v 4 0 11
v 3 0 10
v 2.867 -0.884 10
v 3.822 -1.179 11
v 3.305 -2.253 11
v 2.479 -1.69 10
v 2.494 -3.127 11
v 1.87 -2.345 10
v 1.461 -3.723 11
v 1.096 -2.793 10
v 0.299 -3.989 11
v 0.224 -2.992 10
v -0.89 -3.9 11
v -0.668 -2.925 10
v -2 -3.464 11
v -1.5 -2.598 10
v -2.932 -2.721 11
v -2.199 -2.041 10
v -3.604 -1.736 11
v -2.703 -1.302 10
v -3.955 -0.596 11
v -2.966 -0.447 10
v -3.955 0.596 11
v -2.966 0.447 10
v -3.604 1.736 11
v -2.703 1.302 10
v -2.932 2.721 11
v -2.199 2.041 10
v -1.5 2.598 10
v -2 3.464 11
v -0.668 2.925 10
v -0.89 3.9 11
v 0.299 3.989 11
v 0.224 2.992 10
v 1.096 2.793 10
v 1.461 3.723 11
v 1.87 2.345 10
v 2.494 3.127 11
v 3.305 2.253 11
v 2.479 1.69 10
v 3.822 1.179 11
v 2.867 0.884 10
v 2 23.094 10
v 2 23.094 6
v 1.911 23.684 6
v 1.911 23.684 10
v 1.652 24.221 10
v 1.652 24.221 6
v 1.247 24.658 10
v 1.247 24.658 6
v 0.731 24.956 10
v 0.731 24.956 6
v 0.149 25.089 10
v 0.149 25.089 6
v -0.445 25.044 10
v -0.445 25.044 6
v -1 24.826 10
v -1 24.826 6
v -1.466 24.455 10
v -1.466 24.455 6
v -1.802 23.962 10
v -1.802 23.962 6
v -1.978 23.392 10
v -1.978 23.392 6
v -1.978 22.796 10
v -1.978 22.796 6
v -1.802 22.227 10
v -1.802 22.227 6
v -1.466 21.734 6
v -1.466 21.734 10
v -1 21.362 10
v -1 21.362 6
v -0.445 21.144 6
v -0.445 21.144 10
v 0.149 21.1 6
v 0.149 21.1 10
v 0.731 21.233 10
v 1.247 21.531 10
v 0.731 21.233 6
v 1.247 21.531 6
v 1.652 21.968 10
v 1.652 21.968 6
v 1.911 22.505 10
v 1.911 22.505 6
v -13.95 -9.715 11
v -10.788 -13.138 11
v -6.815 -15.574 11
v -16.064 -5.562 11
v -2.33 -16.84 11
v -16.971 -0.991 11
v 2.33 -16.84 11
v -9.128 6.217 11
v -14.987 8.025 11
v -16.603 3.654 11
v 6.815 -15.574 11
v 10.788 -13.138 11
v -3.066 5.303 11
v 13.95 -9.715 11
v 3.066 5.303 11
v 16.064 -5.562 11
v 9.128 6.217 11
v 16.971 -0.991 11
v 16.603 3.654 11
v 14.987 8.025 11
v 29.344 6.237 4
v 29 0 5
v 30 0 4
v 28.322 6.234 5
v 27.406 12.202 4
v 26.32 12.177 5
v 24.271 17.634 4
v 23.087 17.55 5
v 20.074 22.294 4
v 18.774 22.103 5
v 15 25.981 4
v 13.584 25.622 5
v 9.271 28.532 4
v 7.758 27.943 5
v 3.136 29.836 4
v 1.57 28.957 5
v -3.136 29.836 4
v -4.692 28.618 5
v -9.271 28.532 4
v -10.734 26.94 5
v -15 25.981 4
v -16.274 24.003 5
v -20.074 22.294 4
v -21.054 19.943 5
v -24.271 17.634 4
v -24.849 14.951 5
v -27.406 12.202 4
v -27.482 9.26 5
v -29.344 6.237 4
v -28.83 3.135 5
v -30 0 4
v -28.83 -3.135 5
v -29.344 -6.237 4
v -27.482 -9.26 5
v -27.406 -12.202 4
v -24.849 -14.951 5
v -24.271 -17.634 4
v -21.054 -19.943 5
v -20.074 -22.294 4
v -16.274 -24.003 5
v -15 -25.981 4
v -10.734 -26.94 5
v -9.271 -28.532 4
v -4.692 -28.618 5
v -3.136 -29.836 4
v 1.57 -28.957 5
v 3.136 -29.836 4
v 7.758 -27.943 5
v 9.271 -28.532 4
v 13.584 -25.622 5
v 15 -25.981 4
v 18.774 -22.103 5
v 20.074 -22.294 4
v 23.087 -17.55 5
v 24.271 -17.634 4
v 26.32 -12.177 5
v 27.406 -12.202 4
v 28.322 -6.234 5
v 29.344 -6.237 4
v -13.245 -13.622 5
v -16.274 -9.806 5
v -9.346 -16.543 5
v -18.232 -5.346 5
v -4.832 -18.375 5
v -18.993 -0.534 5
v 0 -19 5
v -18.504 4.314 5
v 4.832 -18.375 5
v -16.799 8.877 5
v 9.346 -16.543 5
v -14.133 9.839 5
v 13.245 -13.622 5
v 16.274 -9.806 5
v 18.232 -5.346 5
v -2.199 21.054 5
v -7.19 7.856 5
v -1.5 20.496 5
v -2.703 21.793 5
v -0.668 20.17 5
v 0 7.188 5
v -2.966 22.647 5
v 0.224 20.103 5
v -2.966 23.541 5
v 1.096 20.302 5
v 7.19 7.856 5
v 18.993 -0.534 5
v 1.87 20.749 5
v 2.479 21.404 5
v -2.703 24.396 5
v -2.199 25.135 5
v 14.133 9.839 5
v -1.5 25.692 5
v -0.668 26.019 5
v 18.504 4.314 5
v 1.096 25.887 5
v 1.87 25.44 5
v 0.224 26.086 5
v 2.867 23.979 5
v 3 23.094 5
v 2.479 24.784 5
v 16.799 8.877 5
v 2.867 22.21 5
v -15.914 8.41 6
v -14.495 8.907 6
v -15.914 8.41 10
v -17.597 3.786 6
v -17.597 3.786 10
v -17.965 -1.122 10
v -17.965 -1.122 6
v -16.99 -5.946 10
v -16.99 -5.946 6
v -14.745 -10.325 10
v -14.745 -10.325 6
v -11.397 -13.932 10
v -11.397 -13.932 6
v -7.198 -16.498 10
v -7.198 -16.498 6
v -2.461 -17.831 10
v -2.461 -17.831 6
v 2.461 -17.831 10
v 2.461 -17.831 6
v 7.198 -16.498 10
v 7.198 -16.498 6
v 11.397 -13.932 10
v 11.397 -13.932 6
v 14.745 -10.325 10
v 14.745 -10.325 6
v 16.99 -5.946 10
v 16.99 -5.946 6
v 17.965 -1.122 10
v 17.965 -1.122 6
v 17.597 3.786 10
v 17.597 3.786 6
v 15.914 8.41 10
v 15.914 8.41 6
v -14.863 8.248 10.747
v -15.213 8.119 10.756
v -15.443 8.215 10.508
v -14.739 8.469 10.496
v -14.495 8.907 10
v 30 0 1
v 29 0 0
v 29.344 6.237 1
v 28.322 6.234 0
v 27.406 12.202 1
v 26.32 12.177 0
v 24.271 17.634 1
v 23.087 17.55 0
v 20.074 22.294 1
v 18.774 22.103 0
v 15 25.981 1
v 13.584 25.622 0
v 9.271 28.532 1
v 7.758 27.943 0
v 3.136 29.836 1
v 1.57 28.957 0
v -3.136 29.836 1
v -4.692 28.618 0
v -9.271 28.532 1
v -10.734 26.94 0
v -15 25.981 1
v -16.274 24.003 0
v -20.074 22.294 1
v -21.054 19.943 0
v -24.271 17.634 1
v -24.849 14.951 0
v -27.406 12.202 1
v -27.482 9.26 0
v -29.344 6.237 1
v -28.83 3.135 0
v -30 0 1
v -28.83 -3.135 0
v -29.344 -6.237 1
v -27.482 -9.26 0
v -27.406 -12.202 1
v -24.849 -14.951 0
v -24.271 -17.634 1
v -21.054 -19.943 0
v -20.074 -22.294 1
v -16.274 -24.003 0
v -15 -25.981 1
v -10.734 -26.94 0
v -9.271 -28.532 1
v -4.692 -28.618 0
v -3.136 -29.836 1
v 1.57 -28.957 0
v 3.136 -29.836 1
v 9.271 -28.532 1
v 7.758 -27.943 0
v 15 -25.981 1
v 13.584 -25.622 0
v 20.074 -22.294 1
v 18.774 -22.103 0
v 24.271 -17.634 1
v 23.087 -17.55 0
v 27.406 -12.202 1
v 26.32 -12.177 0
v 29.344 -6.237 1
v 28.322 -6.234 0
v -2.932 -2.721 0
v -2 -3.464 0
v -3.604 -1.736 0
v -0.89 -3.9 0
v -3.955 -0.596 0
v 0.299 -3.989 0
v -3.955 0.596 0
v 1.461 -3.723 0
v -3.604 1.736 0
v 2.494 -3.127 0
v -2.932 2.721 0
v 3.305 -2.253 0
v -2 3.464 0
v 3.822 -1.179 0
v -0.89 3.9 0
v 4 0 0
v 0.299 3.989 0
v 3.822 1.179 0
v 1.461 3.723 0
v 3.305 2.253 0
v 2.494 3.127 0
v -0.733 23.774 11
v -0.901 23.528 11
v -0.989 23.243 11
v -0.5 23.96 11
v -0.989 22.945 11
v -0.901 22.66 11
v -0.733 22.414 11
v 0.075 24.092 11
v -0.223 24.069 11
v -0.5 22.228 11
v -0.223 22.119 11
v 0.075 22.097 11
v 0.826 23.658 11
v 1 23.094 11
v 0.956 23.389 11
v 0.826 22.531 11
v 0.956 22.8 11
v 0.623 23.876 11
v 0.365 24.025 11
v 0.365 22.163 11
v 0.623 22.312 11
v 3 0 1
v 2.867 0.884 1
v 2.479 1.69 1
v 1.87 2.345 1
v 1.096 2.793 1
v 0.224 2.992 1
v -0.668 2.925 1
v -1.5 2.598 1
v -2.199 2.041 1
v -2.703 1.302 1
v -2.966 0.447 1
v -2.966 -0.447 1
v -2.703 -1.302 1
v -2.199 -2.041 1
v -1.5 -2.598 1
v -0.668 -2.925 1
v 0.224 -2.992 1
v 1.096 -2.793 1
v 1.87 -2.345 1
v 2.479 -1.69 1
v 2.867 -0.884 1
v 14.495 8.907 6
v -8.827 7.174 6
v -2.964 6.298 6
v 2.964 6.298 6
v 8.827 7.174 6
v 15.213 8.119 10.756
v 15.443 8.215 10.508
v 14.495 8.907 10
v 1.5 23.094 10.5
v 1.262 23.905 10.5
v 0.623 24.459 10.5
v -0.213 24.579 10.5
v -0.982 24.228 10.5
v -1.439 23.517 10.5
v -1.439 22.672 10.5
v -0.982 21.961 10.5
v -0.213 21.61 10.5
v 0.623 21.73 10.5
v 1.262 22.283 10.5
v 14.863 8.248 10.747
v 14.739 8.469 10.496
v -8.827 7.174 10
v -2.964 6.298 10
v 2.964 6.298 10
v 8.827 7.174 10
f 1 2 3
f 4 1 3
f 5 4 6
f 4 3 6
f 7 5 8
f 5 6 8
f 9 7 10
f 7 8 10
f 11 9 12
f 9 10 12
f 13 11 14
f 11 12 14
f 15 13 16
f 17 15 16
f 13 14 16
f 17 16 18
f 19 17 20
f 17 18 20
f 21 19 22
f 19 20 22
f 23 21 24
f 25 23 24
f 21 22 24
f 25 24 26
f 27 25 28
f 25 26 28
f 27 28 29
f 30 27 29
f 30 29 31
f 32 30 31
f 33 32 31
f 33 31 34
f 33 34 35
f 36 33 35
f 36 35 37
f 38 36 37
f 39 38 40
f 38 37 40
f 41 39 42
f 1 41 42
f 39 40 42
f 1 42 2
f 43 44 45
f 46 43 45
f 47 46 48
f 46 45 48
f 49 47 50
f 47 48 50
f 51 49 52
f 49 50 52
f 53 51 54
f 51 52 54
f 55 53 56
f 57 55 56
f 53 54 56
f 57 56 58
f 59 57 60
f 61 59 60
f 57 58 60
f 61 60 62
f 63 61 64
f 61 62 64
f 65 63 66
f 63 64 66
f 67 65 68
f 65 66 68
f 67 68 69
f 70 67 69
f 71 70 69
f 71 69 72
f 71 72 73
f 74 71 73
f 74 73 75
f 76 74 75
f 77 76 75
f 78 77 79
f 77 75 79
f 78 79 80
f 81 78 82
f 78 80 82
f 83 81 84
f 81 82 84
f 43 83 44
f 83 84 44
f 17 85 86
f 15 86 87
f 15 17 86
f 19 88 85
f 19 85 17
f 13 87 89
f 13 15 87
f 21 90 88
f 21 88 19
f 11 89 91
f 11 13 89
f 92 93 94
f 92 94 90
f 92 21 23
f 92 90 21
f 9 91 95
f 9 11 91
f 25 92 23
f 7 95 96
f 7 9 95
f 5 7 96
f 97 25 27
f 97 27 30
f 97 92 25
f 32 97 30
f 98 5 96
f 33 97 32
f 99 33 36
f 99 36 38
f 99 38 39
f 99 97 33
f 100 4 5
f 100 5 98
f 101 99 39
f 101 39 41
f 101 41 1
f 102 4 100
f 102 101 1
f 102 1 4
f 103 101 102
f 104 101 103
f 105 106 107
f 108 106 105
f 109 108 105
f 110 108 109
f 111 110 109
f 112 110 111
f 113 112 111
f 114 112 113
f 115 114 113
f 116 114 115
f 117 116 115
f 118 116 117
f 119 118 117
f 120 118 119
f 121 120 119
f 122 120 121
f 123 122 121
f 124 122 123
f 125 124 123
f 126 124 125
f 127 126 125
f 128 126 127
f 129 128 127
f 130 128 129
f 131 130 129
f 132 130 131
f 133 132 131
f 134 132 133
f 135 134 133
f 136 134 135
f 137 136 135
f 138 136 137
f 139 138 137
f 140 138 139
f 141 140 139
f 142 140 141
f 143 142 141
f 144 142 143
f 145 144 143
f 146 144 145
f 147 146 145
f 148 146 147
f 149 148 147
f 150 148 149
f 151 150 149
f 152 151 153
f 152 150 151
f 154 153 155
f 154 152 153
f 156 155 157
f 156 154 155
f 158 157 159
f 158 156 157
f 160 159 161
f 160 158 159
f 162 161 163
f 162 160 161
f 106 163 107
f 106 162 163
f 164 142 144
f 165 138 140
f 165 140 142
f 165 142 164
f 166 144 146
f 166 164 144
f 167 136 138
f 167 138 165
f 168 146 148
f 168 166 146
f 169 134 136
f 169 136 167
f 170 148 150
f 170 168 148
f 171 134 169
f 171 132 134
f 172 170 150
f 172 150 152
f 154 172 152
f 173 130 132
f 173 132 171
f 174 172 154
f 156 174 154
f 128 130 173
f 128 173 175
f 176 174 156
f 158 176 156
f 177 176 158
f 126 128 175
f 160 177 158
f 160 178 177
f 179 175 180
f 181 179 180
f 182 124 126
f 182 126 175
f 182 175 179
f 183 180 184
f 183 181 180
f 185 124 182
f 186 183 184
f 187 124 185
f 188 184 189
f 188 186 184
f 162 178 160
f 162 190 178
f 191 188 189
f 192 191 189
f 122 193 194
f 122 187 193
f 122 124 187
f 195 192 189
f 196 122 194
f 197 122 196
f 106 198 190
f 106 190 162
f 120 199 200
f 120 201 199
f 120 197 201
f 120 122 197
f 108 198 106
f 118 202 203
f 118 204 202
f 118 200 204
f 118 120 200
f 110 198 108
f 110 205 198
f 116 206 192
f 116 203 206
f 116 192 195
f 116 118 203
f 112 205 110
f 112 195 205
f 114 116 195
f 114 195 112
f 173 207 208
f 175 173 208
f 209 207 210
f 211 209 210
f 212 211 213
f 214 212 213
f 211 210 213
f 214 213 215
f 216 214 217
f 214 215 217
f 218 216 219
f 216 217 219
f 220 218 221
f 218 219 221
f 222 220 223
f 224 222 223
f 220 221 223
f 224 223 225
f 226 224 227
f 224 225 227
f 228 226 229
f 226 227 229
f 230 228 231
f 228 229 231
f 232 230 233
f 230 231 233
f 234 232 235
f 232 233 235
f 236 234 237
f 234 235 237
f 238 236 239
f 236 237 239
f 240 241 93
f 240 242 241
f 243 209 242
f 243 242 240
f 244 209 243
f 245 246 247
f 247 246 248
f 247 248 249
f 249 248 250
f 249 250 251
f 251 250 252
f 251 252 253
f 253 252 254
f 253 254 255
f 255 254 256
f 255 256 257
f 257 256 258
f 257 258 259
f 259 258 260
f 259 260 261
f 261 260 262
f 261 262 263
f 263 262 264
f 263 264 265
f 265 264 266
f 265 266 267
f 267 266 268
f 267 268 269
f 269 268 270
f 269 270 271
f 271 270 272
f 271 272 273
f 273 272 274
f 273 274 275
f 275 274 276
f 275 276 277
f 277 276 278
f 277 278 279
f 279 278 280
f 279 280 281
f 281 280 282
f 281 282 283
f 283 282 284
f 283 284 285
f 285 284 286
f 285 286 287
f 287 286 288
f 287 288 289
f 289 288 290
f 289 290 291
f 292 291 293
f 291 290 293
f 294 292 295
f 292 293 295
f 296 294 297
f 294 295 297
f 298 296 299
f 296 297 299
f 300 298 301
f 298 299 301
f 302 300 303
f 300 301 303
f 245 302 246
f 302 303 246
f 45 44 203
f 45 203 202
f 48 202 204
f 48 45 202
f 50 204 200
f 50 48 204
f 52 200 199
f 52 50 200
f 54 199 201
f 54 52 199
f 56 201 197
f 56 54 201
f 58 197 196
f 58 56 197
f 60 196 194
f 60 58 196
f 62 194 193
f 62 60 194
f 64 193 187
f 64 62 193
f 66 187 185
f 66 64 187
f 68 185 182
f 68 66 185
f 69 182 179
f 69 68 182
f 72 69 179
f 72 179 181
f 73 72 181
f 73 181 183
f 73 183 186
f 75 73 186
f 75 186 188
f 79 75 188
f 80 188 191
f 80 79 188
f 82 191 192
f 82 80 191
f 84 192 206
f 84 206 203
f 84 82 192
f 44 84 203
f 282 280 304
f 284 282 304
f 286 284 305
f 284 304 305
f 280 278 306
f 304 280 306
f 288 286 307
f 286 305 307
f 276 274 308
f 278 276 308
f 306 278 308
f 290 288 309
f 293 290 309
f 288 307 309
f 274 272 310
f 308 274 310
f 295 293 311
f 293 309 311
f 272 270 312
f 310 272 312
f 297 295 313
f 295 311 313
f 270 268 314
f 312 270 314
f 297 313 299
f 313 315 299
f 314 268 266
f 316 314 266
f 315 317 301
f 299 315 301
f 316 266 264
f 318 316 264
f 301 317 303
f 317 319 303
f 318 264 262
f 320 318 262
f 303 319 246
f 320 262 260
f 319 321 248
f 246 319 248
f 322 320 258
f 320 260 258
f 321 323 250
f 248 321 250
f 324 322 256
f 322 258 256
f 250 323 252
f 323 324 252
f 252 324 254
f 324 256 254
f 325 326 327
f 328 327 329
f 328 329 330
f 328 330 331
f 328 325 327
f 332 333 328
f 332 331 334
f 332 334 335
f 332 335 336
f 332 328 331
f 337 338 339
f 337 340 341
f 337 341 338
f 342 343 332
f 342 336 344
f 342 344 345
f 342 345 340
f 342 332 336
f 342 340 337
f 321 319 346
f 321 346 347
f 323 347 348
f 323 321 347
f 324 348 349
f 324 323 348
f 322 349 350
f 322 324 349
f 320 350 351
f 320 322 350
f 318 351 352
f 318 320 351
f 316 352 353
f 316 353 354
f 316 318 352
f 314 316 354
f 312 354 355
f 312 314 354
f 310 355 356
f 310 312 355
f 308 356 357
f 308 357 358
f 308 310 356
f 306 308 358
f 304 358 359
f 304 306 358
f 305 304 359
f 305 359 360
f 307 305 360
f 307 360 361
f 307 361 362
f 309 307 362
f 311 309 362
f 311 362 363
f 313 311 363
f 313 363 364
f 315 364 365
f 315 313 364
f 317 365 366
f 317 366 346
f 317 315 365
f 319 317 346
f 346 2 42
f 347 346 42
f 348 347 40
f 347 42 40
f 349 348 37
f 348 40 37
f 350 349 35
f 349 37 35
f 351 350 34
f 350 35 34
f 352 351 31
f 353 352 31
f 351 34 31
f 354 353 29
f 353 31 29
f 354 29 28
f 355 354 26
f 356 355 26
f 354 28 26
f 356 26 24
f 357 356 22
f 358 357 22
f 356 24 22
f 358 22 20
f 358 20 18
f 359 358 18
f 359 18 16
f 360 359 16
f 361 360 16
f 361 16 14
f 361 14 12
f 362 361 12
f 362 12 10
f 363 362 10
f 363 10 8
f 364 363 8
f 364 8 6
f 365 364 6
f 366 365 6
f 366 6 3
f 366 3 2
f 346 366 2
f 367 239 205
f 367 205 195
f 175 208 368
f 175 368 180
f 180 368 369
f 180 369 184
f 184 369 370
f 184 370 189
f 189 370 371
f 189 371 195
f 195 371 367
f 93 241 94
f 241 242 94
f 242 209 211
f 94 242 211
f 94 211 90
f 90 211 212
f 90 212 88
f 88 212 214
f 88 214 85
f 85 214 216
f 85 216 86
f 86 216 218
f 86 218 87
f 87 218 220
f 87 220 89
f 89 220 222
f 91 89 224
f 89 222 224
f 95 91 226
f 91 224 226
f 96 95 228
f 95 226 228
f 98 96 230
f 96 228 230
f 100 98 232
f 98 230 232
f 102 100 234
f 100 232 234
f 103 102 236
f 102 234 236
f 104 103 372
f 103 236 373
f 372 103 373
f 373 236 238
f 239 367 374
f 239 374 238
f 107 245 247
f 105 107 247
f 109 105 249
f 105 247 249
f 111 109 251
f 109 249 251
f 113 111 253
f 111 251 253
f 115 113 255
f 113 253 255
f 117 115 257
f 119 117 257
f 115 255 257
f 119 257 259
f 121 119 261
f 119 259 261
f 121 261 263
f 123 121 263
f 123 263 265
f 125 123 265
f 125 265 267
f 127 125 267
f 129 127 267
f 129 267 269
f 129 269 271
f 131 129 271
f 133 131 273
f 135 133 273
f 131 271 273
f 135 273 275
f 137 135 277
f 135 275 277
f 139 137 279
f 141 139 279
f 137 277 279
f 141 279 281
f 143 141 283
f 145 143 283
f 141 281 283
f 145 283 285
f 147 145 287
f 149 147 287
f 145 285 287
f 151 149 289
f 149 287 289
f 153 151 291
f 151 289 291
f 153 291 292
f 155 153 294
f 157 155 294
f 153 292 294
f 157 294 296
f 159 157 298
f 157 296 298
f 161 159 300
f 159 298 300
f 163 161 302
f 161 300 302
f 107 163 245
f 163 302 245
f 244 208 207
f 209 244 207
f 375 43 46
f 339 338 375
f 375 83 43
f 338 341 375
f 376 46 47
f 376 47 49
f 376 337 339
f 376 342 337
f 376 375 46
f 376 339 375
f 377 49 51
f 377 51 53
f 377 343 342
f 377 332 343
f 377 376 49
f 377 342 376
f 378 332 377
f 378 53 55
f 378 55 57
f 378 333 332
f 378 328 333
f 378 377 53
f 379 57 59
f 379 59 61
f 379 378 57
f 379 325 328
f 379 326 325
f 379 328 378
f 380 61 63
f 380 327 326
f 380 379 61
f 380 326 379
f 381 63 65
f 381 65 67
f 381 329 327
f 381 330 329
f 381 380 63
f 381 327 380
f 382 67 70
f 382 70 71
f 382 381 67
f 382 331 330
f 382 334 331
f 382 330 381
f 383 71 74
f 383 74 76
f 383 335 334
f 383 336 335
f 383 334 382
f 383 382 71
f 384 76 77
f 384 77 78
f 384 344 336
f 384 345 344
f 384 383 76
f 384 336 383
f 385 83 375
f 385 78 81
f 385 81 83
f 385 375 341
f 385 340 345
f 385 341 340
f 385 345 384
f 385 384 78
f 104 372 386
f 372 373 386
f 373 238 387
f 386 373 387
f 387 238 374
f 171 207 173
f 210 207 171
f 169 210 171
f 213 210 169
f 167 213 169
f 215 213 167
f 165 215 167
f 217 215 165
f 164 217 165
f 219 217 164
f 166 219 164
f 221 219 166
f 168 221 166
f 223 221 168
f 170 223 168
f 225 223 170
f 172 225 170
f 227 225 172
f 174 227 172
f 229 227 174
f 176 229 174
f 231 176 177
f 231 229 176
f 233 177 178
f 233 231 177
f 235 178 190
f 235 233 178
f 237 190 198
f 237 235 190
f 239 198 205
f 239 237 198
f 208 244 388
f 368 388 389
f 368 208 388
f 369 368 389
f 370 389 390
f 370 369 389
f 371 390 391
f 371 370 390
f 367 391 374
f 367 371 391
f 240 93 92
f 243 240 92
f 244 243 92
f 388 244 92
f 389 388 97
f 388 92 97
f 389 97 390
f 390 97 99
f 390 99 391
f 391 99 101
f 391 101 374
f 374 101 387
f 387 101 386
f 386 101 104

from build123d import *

# Parameters (mm, degrees)
SKETCH003_R          = 30
PAD001_DEPTH         = 5
SKETCH004_R          = 2
PAD002_DEPTH         = 6
SKETCH005_R          = 3
POCKET002_DEPTH      = 5.001
POCKET002_DEPTH_BACK = 6.001
CHAMFER002_SIZE      = 1


with BuildPart() as part:
    # Sketch003 → Pad001 (new body)
    with BuildSketch(Plane.XY):
        Circle(SKETCH003_R)
    extrude(amount=PAD001_DEPTH)

    # Sketch004 (on Face3 of Pad001) → Pad002 (join)
    with BuildSketch(Plane.XY.offset(5)):
        with Locations((0, 23.0943)):
            Circle(SKETCH004_R)
        with BuildLine():
            ThreePointArc((-15.422876, 9.280888), (0, -18), (15.422876, 9.280888))
            ThreePointArc((-15.422876, 9.280888), (0, 6.188), (15.422876, 9.280888))
        make_face()
    extrude(amount=PAD002_DEPTH)

    # Sketch005 (on Face3 of Pad002) → Pocket002 (cut, two sides)
    with BuildSketch(Plane.XY.offset(5)) as pocket002_sk:
        Circle(SKETCH005_R)
    extrude(amount=-POCKET002_DEPTH, mode=Mode.SUBTRACT)
    extrude(pocket002_sk.sketch, amount=POCKET002_DEPTH_BACK, mode=Mode.SUBTRACT)

    # Chamfer002
    chamfer002_edges = [part.edges().sort_by_distance(p)[0] for p in [
        (30, 0, 2.5),
        (-30, 0, 0),
        (-30, 0, 5),
        (-3, 0, 0),
        (0, -18, 5),
        (0, 6.188, 5),
        (-2, 23.0943, 5),
        (-3, 0, 11),
        (3, 0, 5.5),
        (-15.422876, 9.280888, 8),
        (15.422876, 9.280888, 8),
        (0, -18, 11),
        (0, 6.188, 11),
        (2, 23.0943, 8),
        (-2, 23.0943, 11),
    ]]
    chamfer(chamfer002_edges, length=CHAMFER002_SIZE)


solid = part.part
